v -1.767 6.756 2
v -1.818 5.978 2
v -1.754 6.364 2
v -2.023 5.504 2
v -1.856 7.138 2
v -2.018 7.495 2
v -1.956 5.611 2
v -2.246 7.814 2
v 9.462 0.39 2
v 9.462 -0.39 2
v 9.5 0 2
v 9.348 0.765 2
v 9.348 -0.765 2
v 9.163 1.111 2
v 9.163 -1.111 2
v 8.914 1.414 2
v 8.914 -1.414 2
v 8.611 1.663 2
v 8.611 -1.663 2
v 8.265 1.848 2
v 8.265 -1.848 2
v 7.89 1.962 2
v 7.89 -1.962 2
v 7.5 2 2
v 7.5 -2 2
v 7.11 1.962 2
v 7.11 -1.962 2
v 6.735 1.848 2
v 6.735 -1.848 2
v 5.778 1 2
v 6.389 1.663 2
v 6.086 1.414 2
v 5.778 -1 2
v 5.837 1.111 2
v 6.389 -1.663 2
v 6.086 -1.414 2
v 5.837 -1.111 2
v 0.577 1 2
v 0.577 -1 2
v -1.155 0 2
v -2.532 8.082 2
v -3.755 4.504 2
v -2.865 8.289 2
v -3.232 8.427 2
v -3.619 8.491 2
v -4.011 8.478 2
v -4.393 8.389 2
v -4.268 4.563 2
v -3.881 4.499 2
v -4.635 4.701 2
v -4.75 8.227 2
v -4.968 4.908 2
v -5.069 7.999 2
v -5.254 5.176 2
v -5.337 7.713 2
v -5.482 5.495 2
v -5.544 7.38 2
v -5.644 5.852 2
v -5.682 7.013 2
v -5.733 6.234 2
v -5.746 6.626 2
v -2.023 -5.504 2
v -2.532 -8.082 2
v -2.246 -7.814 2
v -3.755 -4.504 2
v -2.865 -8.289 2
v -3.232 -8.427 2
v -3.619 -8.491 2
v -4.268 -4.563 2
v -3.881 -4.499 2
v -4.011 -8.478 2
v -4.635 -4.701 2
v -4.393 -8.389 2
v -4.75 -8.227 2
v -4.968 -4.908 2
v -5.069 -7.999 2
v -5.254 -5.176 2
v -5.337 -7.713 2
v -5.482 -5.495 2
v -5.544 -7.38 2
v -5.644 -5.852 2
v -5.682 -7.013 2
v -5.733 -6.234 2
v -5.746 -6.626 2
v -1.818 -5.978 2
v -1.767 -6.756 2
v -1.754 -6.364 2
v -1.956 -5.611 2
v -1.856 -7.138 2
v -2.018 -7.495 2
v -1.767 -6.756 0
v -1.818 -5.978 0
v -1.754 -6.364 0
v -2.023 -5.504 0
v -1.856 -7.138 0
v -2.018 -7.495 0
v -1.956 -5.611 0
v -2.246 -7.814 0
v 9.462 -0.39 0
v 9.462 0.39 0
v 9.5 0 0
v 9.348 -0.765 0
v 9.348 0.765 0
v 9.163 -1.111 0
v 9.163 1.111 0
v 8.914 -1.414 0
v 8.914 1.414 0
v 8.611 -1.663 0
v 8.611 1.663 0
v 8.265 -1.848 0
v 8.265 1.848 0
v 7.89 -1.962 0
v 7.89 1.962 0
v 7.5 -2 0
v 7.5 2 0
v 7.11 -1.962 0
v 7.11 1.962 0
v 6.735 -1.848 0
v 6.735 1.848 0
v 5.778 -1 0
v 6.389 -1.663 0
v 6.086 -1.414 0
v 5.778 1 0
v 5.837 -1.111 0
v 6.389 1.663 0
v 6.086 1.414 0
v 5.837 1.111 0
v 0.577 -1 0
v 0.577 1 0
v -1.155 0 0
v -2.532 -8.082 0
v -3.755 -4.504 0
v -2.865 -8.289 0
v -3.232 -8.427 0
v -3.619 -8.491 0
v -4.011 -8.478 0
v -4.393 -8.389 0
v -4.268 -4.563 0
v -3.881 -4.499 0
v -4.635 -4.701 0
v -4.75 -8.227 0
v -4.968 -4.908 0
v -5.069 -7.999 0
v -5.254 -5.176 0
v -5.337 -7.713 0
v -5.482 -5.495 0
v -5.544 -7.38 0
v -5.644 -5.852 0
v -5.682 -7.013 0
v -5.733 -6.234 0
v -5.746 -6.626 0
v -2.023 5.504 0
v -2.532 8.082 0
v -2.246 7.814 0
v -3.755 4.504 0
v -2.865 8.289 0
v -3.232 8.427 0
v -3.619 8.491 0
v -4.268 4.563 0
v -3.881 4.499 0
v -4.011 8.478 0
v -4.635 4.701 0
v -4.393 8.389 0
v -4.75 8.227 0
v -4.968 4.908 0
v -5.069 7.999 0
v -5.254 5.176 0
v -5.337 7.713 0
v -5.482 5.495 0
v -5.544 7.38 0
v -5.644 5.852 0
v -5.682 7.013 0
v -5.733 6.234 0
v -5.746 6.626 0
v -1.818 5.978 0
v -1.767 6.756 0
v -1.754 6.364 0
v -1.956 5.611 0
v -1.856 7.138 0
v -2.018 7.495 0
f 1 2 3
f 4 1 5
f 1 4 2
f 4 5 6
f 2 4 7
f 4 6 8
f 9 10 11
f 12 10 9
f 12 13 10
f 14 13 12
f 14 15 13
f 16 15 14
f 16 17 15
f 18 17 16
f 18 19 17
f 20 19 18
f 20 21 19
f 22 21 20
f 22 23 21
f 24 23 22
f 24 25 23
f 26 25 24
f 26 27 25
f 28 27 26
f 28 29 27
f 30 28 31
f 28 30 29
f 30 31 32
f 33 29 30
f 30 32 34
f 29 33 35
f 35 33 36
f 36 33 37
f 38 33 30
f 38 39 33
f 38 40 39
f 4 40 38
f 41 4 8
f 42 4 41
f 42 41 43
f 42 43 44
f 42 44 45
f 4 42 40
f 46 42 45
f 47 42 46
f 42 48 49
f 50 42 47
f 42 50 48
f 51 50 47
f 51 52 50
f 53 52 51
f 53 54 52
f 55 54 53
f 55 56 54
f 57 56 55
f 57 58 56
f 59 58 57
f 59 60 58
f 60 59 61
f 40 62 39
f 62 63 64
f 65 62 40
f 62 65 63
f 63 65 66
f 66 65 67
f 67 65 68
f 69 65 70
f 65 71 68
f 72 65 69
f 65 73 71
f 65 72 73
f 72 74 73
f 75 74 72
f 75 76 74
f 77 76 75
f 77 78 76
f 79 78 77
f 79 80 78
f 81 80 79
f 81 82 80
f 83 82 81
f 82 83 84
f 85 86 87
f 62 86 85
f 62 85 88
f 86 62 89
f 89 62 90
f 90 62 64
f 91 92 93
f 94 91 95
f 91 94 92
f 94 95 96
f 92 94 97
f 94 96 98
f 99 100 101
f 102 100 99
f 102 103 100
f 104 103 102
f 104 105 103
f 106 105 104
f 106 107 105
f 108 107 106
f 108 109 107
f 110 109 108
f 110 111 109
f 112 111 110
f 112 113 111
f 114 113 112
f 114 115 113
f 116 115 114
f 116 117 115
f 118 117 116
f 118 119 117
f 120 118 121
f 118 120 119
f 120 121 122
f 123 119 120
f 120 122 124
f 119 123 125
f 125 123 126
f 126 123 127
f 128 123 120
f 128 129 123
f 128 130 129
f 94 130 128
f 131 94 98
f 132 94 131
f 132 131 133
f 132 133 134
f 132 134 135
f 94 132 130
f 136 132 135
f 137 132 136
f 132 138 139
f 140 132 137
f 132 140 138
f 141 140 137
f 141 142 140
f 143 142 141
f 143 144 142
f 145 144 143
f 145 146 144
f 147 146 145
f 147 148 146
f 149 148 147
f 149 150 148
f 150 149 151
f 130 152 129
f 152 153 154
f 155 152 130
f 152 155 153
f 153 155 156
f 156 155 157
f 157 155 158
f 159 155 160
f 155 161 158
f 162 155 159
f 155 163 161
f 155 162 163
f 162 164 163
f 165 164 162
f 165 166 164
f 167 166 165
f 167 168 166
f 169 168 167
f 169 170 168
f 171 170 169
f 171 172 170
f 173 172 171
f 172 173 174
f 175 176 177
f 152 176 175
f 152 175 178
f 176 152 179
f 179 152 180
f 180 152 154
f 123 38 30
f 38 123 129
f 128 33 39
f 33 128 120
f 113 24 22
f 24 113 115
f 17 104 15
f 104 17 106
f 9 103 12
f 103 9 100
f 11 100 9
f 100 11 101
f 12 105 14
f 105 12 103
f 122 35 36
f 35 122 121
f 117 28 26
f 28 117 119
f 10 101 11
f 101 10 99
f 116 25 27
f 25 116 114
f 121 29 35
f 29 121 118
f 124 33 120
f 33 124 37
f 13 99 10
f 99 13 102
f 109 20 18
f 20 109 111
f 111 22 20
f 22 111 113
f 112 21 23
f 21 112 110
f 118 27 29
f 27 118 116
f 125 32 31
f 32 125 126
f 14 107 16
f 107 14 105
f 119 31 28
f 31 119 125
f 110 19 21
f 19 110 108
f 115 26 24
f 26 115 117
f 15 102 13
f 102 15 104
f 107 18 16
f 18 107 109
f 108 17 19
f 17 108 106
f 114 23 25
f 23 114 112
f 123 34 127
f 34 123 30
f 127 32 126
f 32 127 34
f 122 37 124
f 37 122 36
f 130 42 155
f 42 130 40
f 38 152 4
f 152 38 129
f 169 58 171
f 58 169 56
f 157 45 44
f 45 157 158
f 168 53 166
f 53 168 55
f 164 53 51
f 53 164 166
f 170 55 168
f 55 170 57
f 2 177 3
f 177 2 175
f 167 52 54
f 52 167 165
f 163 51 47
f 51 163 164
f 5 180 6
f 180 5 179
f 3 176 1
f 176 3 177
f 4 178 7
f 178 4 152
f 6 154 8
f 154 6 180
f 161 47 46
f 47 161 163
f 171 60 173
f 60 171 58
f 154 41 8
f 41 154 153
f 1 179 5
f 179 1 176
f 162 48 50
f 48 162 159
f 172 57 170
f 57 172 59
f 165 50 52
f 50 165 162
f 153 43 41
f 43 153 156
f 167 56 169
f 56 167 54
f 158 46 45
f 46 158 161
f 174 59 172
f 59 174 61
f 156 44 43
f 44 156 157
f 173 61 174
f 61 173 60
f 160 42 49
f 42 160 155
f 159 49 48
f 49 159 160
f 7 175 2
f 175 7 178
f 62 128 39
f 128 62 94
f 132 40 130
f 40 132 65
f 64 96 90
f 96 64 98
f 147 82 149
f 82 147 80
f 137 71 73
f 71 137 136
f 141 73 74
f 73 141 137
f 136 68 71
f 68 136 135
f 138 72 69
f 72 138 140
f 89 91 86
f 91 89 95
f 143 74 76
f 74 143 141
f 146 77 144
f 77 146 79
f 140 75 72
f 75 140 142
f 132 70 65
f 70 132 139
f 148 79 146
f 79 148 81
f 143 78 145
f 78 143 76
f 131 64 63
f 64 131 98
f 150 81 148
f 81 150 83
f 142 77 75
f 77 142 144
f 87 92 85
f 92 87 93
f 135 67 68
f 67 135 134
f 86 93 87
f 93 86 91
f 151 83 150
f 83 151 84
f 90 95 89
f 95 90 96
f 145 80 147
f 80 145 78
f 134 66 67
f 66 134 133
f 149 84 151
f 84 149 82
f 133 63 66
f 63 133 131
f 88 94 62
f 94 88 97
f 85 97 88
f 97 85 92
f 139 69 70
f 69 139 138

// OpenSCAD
// Flexy-Frame v4 by Gyrobot
// http://www.gyrobot.co.uk
//
//Standard Males were generated with the following params :
//
//    type = "male"
//    diameter_of_connection = 4
//    pitch_circle_diameter = 15
//    limb_height = 2
//    limb_thickness = 2
//
//Standard Females were generated with the following params :
//
//    type = "female"
//    diameter_of_connection = 4
//    pitch_circle_diameter = 40
//    limb_height = 2
//    limb_thickness = 3
//
// preview[view:east, tilt:top]

type = "male" ; // [male,female]
number_of_lobes = 3 ;// [2:100]
web_plate_height = 0;
diameter_of_connection = 4 ;
pitch_circle_diameter = 15 ;
male_limb_height = 2 ; // 1mm is automatically added to this for Female limb height
limb_thickness = 2 ;

// Start of Code

n=number_of_lobes ;
ph=web_plate_height ;
d=diameter_of_connection ;
pcd=pitch_circle_diameter ;
h=male_limb_height ;
t=limb_thickness ;
a=360/n ;

if (type == "male")
	male();

if (type == "female")
	female();

$fn=32*1 ;	

module male ()
{
	if (ph > 0)
		assign ($fn=n)
		cylinder (h=ph, r=pcd/2-d) ;

	for (ia = [0:a:360])
	{
		rotate (ia,[0,0,1])
		{
			translate ([0,-t/2,0])
			cube ([pcd/2,t,h]) ;
			translate ([pcd/2,0,0])
			cylinder (h=h, r=d/2) ;

		}
	}
}

module female ()
{
	difference ()
	{
		union ()
		{
			if (ph > 0)
				assign ($fn=n)
				cylinder (h=ph, r=pcd/2+d) ;

			for (ia = [0:a:360])
			{
				rotate (ia,[0,0,1])
				{
					translate ([0,-t/2,0])
						cube ([pcd/2,t,h+1]) ;
					translate ([pcd/2,0,0])
						cylinder (h=h+1, r=d) ;
					linear_extrude (height = h+1, convexity= 3)
						polygon (points=[[pcd/2-d*1.5,t/-2],[pcd/2-d*1.5,t/2],[pcd/2,d],[pcd/2,-d]]);
				}
			}
		}
		for (ia = [0:a:360])
		{
			rotate (ia,[0,0,1])
			{
				translate ([pcd/2,0,1])
					{
						cylinder (h=ph+2, r=d/2) ;
						translate ([0,-d/4,0])
						cube ([pcd/2,d/2,ph+2]) ;
					}
			}
		}
	}
}
